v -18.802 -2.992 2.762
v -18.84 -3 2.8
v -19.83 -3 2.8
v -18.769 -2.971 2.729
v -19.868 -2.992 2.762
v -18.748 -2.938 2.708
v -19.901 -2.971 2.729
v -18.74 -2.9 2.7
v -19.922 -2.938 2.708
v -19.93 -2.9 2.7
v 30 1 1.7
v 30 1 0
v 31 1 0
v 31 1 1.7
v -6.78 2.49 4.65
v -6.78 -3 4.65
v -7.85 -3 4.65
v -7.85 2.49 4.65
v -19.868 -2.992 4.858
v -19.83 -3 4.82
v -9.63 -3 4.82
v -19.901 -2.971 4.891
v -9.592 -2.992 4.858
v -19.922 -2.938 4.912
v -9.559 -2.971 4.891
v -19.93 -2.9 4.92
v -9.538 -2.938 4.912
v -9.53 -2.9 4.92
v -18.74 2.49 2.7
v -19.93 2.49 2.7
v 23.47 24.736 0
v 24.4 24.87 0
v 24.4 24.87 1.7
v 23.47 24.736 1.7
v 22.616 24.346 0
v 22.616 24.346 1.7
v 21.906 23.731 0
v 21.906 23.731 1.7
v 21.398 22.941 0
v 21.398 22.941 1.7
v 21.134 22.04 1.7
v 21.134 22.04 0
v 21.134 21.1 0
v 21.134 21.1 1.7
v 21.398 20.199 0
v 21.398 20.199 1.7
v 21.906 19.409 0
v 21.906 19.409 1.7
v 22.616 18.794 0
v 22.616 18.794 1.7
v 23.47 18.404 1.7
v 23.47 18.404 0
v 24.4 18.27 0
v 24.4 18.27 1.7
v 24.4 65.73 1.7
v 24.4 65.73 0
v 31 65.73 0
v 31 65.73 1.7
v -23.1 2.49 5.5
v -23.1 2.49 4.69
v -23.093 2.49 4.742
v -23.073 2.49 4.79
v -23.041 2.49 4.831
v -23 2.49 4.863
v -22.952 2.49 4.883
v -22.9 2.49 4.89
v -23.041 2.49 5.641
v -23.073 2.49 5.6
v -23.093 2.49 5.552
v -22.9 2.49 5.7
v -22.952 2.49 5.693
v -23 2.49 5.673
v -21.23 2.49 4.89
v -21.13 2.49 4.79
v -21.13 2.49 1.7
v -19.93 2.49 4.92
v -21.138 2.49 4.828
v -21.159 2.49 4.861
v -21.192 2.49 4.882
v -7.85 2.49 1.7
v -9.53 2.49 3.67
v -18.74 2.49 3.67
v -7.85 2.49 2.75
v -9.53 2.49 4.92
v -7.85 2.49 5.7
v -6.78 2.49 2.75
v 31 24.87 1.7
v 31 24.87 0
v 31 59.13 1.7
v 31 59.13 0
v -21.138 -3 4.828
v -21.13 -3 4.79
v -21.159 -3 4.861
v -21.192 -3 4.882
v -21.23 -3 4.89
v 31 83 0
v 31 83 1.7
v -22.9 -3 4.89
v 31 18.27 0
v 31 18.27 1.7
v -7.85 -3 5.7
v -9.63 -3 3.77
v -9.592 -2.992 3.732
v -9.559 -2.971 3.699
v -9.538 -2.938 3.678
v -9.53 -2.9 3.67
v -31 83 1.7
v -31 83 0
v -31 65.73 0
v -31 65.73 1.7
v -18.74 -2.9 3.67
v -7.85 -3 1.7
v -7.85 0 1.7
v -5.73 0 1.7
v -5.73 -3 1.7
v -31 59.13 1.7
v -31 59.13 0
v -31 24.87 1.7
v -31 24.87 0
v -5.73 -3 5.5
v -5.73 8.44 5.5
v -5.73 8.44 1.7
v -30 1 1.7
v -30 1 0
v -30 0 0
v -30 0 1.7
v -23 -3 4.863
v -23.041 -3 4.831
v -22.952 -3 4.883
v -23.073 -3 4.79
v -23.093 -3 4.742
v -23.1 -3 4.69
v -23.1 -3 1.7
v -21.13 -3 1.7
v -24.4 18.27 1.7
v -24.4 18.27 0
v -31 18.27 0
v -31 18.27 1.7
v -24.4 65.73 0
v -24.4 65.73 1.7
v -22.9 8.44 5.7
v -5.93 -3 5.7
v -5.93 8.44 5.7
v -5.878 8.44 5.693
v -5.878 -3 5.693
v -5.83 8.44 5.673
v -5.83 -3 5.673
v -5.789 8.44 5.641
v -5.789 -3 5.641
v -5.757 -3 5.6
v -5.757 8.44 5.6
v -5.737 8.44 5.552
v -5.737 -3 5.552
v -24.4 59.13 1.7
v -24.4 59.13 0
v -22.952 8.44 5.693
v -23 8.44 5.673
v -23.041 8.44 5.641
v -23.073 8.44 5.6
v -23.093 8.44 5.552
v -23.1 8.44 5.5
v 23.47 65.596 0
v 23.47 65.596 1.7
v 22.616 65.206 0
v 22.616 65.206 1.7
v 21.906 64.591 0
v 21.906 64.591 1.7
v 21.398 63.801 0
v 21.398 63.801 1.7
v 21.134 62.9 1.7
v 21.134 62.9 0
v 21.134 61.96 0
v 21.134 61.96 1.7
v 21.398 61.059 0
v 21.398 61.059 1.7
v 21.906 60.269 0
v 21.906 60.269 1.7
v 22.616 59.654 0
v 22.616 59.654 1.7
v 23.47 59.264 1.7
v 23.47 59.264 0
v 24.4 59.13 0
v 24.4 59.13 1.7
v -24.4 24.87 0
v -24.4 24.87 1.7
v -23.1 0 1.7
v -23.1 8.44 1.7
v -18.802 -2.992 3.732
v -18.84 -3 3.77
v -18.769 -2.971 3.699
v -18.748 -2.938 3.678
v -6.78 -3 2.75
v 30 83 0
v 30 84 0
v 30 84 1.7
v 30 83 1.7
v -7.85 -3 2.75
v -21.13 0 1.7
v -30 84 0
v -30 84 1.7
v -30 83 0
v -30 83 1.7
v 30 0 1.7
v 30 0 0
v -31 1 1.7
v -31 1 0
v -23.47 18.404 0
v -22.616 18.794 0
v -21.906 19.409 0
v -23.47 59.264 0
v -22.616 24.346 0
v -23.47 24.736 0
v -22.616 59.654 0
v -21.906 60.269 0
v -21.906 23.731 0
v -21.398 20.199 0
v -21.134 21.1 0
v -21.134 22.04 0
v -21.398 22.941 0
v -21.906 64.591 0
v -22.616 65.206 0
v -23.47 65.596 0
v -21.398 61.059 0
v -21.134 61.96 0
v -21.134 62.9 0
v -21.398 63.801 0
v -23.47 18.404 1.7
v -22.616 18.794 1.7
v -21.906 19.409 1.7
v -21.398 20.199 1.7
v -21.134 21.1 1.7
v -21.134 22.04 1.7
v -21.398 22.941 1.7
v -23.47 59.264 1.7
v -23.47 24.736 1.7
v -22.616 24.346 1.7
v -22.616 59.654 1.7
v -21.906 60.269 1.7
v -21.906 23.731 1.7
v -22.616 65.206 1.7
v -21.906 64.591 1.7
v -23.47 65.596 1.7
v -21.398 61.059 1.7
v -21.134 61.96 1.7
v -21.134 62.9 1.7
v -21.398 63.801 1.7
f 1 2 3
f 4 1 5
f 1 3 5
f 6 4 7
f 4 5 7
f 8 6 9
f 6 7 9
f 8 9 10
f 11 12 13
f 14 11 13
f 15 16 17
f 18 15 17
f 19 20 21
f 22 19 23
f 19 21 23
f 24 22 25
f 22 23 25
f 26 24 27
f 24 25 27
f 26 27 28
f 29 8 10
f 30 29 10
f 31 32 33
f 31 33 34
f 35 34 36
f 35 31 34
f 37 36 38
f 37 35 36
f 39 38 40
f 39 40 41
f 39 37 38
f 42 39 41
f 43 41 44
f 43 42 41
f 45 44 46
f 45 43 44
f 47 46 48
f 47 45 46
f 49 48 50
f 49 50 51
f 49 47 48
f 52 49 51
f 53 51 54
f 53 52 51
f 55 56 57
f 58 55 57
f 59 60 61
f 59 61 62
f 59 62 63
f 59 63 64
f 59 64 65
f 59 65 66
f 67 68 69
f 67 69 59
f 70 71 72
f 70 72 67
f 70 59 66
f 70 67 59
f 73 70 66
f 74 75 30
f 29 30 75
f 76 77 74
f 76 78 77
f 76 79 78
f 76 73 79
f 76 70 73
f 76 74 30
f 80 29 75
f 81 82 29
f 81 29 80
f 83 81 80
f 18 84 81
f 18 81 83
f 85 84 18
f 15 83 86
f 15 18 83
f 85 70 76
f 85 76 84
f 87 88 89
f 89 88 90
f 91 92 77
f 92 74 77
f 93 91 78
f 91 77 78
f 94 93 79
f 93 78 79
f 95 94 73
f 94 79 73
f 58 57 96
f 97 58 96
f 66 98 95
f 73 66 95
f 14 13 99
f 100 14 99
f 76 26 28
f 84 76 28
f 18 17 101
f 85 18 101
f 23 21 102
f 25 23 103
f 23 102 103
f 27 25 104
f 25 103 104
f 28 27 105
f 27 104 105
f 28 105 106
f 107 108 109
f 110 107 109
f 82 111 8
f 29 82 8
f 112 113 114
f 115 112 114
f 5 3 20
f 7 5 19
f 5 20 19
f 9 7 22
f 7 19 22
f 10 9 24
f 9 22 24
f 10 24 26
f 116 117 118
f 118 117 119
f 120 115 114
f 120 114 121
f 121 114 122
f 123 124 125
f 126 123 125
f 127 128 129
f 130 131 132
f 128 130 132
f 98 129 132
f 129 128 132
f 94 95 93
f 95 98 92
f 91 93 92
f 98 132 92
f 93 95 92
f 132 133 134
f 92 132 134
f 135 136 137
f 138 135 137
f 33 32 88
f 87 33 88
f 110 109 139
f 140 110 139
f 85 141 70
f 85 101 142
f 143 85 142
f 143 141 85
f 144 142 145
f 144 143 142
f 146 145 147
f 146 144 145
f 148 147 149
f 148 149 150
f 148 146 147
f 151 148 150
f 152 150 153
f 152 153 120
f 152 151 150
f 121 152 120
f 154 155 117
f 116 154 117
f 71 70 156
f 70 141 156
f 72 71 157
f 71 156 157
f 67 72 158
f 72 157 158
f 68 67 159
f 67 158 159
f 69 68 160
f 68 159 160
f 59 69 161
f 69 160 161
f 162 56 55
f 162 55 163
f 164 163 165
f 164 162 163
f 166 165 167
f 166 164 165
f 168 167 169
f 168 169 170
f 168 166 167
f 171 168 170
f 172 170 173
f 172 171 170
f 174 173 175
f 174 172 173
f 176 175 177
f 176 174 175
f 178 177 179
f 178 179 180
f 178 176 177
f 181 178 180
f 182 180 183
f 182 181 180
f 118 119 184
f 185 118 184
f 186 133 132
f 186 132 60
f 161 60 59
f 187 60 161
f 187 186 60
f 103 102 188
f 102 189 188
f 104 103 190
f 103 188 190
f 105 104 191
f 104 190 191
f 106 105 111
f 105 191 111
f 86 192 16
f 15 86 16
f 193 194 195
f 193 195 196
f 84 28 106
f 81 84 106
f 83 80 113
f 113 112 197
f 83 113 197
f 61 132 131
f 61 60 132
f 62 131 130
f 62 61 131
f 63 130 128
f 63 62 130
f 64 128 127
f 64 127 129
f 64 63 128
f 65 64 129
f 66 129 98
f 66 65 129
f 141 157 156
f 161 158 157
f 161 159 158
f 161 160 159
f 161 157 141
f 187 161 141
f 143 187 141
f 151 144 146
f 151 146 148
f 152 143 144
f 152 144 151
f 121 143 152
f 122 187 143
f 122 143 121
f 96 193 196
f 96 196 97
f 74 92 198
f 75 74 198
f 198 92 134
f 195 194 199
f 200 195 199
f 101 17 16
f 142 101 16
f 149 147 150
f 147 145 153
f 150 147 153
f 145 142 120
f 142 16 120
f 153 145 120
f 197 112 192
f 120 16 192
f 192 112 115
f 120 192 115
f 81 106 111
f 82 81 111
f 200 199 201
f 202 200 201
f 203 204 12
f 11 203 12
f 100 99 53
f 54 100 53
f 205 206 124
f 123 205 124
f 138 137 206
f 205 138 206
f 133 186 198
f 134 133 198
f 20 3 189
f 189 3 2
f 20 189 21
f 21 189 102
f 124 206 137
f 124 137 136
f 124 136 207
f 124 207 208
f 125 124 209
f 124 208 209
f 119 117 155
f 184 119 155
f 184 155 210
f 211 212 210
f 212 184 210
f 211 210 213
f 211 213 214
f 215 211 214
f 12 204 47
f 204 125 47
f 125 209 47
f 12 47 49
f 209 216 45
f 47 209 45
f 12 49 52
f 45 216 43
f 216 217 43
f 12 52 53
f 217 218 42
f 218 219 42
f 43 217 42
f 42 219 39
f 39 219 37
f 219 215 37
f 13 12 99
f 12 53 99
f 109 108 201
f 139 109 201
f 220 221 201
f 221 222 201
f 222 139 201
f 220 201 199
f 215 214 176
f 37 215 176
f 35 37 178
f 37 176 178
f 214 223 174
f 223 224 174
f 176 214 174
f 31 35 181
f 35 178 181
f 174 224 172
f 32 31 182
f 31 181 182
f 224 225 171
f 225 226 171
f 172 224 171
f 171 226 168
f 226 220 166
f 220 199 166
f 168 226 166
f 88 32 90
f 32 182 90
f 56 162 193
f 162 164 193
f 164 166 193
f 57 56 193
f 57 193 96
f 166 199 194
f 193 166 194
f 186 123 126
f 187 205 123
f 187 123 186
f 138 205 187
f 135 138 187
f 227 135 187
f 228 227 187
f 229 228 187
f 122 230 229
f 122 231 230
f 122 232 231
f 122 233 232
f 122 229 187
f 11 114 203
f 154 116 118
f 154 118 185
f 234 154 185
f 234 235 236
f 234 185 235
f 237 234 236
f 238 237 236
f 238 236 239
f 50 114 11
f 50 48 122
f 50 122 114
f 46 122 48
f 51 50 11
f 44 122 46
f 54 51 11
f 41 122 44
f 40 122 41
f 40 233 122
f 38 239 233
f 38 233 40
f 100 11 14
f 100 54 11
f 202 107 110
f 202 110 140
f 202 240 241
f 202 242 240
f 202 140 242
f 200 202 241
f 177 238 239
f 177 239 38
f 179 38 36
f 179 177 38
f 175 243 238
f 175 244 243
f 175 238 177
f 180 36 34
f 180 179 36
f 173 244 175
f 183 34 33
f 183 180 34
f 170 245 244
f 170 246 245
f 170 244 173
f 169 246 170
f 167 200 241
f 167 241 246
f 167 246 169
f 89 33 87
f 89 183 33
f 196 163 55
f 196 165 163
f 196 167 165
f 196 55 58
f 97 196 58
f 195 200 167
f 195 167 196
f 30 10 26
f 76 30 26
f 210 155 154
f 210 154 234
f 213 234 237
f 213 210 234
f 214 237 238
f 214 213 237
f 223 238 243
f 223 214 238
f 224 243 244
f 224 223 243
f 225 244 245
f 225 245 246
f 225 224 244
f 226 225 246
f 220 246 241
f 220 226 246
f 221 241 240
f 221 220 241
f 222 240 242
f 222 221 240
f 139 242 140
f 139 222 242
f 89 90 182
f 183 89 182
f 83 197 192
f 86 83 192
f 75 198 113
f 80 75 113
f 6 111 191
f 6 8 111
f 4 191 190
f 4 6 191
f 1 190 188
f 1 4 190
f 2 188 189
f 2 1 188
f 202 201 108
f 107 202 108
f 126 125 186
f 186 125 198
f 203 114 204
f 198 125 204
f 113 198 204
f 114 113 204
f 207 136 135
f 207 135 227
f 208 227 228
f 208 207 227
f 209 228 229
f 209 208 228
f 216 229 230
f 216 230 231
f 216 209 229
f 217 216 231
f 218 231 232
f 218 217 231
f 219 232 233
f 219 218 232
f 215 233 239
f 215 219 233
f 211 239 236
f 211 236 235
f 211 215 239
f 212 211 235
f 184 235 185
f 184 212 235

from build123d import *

# Parameters (mm, degrees)
PAD_DEPTH       = 1.7
SKETCH007_W     = 17.37
SKETCH007_H     = 11.44
PAD004_DEPTH    = 4
POCKET002_DEPTH = 5.49
FILLET004_R     = 0.2
FILLET005_R     = 0.2
FILLET006_R     = 0.2
FILLET011_R     = 0.1


with BuildPart() as part:
    # Sketch → Pad (new body)
    with BuildSketch(Plane.XY):
        with BuildLine():
            Line((0, 0), (30, 0))
            Line((30, 0), (30, 1))
            Line((30, 1), (31, 1))
            Line((31, 1), (31, 18.27))
            Line((31, 18.27), (24.4, 18.27))
            ThreePointArc((24.4, 24.87), (21.1, 21.57), (24.4, 18.27))
            Line((24.4, 24.87), (31, 24.87))
            Line((31, 24.87), (31, 59.13))
            Line((31, 59.13), (24.4, 59.13))
            ThreePointArc((24.4, 65.73), (21.1, 62.43), (24.4, 59.13))
            Line((24.4, 65.73), (31, 65.73))
            Line((31, 65.73), (31, 83))
            Line((30, 83), (31, 83))
            Line((30, 84), (30, 83))
            Line((30, 84), (0, 84))
            Line((0, 84), (-30, 84))
            Line((-30, 84), (-30, 83))
            Line((-30, 83), (-31, 83))
            Line((-31, 83), (-31, 65.73))
            Line((-31, 65.73), (-24.4, 65.73))
            ThreePointArc((-24.4, 59.13), (-21.1, 62.43), (-24.4, 65.73))
            Line((-24.4, 59.13), (-31, 59.13))
            Line((-31, 59.13), (-31, 24.87))
            Line((-31, 24.87), (-24.4, 24.87))
            ThreePointArc((-24.4, 18.27), (-21.1, 21.57), (-24.4, 24.87))
            Line((-24.4, 18.27), (-31, 18.27))
            Line((-31, 18.27), (-31, 1))
            Line((-31, 1), (-30, 1))
            Line((-30, 1), (-30, 0))
            Line((-30, 0), (0, 0))
        make_face()
    extrude(amount=PAD_DEPTH)

    # Sketch007 → Pad004 (new body)
    with BuildSketch(Plane.XY.offset(1.7)):
        with Locations((-14.415, 2.72)):
            Rectangle(SKETCH007_W, SKETCH007_H)
    extrude(amount=PAD004_DEPTH)

    # Sketch013 → Pocket002 (cut)
    with BuildSketch(Plane.XZ.offset(3)):
        Polygon((-23.1, 5.7), (-23.1, 4.89), (-21.13, 4.89), (-21.13, 1.7), (-7.85, 1.7), (-7.85, 2.75), (-6.78, 2.75), (-6.78, 4.65), (-7.85, 4.65), (-7.85, 5.7), align=None)
        Polygon((-19.93, 2.7), (-19.93, 4.92), (-9.53, 4.92), (-9.53, 3.67), (-18.74, 3.67), (-18.74, 2.7), align=None, mode=Mode.SUBTRACT)
    extrude(amount=-POCKET002_DEPTH, mode=Mode.SUBTRACT)

    # Fillet004
    fillet004_edges = [part.edges().sort_by_distance(p)[0] for p in [
        (-5.73, 2.72, 5.7),
    ]]
    fillet(fillet004_edges, radius=FILLET004_R)

    # Fillet005
    fillet005_edges = [part.edges().sort_by_distance(p)[0] for p in [
        (-23.1, 5.465, 5.7),
    ]]
    fillet(fillet005_edges, radius=FILLET005_R)

    # Fillet006
    fillet006_edges = [part.edges().sort_by_distance(p)[0] for p in [
        (-23.1, -0.255, 4.89),
    ]]
    fillet(fillet006_edges, radius=FILLET006_R)

    # Fillet011
    fillet011_edges = [part.edges().sort_by_distance(p)[0] for p in [
        (-21.13, -0.255, 4.89),
        (-19.335, -3, 2.7),
        (-19.93, -3, 3.81),
        (-14.73, -3, 4.92),
        (-9.53, -3, 4.295),
        (-14.135, -3, 3.67),
        (-18.74, -3, 3.185),
    ]]
    fillet(fillet011_edges, radius=FILLET011_R)


solid = part.part
